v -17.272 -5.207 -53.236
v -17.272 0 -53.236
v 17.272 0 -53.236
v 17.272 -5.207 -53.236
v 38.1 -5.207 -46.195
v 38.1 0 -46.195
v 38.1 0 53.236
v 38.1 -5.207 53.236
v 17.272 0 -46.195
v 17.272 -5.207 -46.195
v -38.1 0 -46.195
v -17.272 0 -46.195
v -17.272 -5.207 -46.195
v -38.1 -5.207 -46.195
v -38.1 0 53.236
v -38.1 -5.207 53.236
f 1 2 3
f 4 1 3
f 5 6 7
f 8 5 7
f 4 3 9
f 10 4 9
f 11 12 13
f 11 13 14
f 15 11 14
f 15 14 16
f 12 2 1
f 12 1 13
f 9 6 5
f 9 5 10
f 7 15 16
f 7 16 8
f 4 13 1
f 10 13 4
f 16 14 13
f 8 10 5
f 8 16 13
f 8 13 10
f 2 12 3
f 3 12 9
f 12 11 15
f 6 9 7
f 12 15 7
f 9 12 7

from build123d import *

# Parameters (mm, degrees)
F0_W     = 76.2
F0_H     = 106.4723501976
F1_DEPTH = 5.207
F2_W     = 20.828
F2_H     = 7.0416366247
F3_DEPTH = 5.207


with BuildPart() as f1:
    # F0 (on Front) → F1 (new body)
    with BuildSketch(Plane.XZ):
        Rectangle(F0_W, F0_H)
    extrude(amount=F1_DEPTH)

    # F2 (on face) → F3 (cut, through all)
    with BuildSketch(Plane(origin=(0, 0, 0), x_dir=(-1, 0, 0), z_dir=(0, 1, 0))):
        with Locations((27.686, -49.7153567864)):
            Rectangle(F2_W, F2_H)
        with Locations((-27.686, -49.7153567864)):
            Rectangle(F2_W, F2_H)
    extrude(amount=-F3_DEPTH, mode=Mode.SUBTRACT)


solid = f1.part
